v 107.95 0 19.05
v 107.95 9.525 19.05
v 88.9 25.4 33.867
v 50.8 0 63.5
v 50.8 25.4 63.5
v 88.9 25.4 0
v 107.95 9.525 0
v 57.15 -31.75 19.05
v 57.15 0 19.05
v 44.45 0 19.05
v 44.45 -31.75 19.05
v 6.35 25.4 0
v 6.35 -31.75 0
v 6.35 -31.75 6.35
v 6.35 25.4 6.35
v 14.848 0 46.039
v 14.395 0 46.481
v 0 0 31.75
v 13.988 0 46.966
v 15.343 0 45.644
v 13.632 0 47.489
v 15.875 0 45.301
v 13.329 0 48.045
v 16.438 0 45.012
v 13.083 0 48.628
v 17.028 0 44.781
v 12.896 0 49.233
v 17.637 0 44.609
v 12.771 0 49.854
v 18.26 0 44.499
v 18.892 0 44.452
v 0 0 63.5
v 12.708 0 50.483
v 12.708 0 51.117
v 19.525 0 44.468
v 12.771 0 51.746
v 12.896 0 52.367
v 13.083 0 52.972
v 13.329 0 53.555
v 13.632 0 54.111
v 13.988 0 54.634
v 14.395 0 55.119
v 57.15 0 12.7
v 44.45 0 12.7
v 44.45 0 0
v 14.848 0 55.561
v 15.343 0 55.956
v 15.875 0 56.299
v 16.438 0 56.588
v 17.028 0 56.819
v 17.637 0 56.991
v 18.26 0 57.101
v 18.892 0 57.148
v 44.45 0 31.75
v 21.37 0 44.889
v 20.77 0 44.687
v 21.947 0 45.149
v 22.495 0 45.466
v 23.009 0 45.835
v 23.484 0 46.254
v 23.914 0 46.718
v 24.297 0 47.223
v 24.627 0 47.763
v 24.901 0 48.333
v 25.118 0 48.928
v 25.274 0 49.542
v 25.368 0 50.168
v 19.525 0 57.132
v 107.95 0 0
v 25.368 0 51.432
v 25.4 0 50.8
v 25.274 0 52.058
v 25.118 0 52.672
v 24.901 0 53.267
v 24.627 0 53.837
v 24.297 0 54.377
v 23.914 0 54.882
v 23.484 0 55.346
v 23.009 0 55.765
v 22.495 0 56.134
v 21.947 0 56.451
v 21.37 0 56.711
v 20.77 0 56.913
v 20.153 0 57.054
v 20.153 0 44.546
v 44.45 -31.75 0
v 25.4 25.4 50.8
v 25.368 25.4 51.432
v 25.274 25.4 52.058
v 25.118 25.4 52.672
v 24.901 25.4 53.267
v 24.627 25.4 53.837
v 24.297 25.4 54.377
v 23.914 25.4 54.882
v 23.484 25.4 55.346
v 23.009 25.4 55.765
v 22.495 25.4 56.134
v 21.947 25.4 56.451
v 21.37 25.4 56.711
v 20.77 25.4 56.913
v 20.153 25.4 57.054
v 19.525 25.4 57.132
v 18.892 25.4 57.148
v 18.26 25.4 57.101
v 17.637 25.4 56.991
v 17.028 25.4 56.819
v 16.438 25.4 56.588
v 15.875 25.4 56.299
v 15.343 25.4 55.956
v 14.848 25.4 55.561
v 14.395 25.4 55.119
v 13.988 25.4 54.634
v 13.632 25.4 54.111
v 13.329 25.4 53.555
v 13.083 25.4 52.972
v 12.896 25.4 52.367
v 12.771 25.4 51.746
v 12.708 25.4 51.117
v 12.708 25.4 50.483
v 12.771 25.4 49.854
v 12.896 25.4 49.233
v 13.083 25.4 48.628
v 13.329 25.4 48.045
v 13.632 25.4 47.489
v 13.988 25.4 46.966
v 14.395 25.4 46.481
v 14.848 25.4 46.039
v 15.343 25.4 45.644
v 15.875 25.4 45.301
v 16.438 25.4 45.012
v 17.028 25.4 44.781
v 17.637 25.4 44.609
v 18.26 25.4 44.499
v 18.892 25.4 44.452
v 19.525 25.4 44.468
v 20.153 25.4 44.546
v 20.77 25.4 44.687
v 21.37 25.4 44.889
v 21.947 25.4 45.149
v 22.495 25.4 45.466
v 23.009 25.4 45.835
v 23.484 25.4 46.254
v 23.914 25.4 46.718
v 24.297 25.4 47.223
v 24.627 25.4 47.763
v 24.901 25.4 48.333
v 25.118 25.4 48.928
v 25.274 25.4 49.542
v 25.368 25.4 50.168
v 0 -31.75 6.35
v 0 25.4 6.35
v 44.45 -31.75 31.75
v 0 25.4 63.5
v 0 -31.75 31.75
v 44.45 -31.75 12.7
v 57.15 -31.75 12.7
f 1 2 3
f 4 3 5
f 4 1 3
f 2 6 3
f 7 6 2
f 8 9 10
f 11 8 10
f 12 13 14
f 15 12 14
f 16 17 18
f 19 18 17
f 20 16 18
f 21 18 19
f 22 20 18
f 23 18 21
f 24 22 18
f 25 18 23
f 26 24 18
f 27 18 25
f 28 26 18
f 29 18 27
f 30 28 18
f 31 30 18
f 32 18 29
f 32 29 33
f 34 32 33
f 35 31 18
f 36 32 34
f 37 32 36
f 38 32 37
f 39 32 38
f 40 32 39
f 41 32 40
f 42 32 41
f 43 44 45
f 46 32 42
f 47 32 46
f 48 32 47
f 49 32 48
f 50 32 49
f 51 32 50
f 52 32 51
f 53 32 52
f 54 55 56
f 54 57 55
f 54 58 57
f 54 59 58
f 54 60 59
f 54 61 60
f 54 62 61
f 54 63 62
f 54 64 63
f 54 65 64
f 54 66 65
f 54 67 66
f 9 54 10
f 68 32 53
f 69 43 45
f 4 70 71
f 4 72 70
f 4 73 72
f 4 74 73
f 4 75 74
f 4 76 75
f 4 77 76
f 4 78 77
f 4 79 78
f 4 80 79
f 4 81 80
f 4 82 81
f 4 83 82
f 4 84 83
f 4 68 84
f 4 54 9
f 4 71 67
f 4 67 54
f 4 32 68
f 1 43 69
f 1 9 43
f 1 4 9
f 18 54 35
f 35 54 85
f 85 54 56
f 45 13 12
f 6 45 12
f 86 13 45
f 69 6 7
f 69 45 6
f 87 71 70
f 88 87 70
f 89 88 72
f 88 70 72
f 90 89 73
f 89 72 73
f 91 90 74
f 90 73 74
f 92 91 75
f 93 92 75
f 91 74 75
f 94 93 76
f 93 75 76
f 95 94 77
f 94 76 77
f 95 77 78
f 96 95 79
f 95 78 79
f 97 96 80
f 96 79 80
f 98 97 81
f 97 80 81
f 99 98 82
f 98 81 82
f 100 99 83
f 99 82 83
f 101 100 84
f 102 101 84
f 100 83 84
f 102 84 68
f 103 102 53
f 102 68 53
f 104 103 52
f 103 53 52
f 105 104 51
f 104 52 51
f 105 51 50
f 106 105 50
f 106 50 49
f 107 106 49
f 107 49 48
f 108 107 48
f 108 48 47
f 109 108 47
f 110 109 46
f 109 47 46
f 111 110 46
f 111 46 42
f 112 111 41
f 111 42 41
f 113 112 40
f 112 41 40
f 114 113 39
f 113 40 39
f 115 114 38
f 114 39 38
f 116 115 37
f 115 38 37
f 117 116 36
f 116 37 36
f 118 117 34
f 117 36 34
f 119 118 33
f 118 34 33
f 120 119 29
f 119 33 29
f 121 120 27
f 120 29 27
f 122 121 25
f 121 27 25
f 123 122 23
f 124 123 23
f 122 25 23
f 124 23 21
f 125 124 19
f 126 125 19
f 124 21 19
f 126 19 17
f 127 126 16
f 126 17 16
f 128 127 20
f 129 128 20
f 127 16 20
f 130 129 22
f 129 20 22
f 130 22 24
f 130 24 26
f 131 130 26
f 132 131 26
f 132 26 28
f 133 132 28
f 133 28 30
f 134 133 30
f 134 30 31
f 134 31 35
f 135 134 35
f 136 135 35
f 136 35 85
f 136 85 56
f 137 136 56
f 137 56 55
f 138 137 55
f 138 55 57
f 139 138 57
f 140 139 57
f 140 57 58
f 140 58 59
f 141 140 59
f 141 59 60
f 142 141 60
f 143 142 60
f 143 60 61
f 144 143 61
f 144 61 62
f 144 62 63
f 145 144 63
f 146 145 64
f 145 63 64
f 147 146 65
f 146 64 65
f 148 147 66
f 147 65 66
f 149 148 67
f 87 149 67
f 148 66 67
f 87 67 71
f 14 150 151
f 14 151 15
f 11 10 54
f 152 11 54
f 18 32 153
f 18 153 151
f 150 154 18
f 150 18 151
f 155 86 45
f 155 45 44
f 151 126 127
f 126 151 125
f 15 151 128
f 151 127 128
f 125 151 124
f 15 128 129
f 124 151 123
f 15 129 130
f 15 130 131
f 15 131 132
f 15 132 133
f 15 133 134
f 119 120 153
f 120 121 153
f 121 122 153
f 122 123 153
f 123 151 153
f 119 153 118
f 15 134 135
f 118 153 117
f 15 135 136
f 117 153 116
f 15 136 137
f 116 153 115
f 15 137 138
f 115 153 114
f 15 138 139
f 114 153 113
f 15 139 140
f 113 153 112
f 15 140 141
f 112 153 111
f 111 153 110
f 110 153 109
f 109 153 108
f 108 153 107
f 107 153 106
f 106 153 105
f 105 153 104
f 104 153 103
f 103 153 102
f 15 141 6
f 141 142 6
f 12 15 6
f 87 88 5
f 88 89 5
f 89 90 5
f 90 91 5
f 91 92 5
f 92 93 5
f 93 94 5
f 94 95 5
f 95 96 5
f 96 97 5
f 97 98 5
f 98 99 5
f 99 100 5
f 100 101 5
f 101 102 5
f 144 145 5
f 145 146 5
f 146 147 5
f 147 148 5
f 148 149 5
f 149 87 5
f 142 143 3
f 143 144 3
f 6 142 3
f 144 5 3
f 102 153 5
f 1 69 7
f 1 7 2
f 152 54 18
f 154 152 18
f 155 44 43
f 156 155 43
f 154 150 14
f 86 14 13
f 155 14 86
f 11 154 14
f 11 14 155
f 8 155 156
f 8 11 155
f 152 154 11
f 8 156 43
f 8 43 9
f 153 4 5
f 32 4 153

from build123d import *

# Parameters (mm, degrees)
F1_DEPTH = 31.75
F2_R     = 6.35
F3_DEPTH = 25.4
F5_DEPTH = 63.501
F6_W     = 6.35
F6_H     = 6.35
F7_DEPTH = 57.151


with BuildPart() as f1:
    # F0 (on Front) → F1 (new body)
    with BuildSketch(Plane.XZ):
        Polygon((0, 31.75), (0, 0), (44.45, 0), (44.45, 12.7), (57.15, 12.7), (57.15, 19.05), (44.45, 19.05), (44.45, 31.75), align=None)
    extrude(amount=F1_DEPTH)

    # F2 (on Front) → F3 (join)
    with BuildSketch(Plane.XZ):
        Polygon((0, 63.5), (0, 0), (107.95, 0), (107.95, 19.05), (50.8, 63.5), align=None)
        with Locations((19.05, 50.8)):
            Circle(F2_R, mode=Mode.SUBTRACT)
    extrude(amount=-F3_DEPTH)

    # F4 (on Top) → F5 (cut, through all)
    with BuildSketch(Plane.XY):
        Polygon((107.95, 25.4), (88.9, 25.4), (107.95, 9.525), align=None)
    extrude(amount=F5_DEPTH, mode=Mode.SUBTRACT)

    # F6 (on face) → F7 (cut, through all)
    with BuildSketch(Plane.XZ.offset(31.75)):
        with Locations((3.175, 3.175)):
            Rectangle(F6_W, F6_H)
    extrude(amount=-F7_DEPTH, mode=Mode.SUBTRACT)


solid = f1.part
